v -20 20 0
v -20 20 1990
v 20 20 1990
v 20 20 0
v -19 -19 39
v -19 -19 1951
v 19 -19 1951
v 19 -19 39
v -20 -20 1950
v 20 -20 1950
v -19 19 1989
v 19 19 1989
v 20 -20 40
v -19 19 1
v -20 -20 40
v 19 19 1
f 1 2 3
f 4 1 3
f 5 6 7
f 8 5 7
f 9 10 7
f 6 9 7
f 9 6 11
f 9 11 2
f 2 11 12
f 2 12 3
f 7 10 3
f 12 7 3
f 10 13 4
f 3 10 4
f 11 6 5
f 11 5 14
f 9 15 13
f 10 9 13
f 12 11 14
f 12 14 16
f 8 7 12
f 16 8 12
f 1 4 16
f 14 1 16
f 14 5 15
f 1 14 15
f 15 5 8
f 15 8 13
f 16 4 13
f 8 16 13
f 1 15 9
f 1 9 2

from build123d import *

# Parameters (mm, degrees)
F0_W     = 40
F0_H     = 40
F0_W_2   = 38
F0_H_2   = 38
F1_DEPTH = 1990
F3_DEPTH = 100
F5_DEPTH = 99


with BuildPart() as f1:
    # F0 (on Top) → F1 (new body)
    with BuildSketch(Plane.XY):
        Rectangle(F0_W, F0_H)
        Rectangle(F0_W_2, F0_H_2, mode=Mode.SUBTRACT)
    extrude(amount=F1_DEPTH)

    # F2 (on face) → F3 (cut)
    with BuildSketch(Plane.YZ.offset(20)):
        Polygon((-20, 1950), (20, 1990), (-20, 1990), align=None)
    extrude(amount=-F3_DEPTH, mode=Mode.SUBTRACT)

    # F4 (on face) → F5 (cut)
    with BuildSketch(Plane.YZ.offset(20)):
        Polygon((-20, 0), (20, 0), (-20, 40), align=None)
    extrude(amount=-F5_DEPTH, mode=Mode.SUBTRACT)


solid = f1.part
